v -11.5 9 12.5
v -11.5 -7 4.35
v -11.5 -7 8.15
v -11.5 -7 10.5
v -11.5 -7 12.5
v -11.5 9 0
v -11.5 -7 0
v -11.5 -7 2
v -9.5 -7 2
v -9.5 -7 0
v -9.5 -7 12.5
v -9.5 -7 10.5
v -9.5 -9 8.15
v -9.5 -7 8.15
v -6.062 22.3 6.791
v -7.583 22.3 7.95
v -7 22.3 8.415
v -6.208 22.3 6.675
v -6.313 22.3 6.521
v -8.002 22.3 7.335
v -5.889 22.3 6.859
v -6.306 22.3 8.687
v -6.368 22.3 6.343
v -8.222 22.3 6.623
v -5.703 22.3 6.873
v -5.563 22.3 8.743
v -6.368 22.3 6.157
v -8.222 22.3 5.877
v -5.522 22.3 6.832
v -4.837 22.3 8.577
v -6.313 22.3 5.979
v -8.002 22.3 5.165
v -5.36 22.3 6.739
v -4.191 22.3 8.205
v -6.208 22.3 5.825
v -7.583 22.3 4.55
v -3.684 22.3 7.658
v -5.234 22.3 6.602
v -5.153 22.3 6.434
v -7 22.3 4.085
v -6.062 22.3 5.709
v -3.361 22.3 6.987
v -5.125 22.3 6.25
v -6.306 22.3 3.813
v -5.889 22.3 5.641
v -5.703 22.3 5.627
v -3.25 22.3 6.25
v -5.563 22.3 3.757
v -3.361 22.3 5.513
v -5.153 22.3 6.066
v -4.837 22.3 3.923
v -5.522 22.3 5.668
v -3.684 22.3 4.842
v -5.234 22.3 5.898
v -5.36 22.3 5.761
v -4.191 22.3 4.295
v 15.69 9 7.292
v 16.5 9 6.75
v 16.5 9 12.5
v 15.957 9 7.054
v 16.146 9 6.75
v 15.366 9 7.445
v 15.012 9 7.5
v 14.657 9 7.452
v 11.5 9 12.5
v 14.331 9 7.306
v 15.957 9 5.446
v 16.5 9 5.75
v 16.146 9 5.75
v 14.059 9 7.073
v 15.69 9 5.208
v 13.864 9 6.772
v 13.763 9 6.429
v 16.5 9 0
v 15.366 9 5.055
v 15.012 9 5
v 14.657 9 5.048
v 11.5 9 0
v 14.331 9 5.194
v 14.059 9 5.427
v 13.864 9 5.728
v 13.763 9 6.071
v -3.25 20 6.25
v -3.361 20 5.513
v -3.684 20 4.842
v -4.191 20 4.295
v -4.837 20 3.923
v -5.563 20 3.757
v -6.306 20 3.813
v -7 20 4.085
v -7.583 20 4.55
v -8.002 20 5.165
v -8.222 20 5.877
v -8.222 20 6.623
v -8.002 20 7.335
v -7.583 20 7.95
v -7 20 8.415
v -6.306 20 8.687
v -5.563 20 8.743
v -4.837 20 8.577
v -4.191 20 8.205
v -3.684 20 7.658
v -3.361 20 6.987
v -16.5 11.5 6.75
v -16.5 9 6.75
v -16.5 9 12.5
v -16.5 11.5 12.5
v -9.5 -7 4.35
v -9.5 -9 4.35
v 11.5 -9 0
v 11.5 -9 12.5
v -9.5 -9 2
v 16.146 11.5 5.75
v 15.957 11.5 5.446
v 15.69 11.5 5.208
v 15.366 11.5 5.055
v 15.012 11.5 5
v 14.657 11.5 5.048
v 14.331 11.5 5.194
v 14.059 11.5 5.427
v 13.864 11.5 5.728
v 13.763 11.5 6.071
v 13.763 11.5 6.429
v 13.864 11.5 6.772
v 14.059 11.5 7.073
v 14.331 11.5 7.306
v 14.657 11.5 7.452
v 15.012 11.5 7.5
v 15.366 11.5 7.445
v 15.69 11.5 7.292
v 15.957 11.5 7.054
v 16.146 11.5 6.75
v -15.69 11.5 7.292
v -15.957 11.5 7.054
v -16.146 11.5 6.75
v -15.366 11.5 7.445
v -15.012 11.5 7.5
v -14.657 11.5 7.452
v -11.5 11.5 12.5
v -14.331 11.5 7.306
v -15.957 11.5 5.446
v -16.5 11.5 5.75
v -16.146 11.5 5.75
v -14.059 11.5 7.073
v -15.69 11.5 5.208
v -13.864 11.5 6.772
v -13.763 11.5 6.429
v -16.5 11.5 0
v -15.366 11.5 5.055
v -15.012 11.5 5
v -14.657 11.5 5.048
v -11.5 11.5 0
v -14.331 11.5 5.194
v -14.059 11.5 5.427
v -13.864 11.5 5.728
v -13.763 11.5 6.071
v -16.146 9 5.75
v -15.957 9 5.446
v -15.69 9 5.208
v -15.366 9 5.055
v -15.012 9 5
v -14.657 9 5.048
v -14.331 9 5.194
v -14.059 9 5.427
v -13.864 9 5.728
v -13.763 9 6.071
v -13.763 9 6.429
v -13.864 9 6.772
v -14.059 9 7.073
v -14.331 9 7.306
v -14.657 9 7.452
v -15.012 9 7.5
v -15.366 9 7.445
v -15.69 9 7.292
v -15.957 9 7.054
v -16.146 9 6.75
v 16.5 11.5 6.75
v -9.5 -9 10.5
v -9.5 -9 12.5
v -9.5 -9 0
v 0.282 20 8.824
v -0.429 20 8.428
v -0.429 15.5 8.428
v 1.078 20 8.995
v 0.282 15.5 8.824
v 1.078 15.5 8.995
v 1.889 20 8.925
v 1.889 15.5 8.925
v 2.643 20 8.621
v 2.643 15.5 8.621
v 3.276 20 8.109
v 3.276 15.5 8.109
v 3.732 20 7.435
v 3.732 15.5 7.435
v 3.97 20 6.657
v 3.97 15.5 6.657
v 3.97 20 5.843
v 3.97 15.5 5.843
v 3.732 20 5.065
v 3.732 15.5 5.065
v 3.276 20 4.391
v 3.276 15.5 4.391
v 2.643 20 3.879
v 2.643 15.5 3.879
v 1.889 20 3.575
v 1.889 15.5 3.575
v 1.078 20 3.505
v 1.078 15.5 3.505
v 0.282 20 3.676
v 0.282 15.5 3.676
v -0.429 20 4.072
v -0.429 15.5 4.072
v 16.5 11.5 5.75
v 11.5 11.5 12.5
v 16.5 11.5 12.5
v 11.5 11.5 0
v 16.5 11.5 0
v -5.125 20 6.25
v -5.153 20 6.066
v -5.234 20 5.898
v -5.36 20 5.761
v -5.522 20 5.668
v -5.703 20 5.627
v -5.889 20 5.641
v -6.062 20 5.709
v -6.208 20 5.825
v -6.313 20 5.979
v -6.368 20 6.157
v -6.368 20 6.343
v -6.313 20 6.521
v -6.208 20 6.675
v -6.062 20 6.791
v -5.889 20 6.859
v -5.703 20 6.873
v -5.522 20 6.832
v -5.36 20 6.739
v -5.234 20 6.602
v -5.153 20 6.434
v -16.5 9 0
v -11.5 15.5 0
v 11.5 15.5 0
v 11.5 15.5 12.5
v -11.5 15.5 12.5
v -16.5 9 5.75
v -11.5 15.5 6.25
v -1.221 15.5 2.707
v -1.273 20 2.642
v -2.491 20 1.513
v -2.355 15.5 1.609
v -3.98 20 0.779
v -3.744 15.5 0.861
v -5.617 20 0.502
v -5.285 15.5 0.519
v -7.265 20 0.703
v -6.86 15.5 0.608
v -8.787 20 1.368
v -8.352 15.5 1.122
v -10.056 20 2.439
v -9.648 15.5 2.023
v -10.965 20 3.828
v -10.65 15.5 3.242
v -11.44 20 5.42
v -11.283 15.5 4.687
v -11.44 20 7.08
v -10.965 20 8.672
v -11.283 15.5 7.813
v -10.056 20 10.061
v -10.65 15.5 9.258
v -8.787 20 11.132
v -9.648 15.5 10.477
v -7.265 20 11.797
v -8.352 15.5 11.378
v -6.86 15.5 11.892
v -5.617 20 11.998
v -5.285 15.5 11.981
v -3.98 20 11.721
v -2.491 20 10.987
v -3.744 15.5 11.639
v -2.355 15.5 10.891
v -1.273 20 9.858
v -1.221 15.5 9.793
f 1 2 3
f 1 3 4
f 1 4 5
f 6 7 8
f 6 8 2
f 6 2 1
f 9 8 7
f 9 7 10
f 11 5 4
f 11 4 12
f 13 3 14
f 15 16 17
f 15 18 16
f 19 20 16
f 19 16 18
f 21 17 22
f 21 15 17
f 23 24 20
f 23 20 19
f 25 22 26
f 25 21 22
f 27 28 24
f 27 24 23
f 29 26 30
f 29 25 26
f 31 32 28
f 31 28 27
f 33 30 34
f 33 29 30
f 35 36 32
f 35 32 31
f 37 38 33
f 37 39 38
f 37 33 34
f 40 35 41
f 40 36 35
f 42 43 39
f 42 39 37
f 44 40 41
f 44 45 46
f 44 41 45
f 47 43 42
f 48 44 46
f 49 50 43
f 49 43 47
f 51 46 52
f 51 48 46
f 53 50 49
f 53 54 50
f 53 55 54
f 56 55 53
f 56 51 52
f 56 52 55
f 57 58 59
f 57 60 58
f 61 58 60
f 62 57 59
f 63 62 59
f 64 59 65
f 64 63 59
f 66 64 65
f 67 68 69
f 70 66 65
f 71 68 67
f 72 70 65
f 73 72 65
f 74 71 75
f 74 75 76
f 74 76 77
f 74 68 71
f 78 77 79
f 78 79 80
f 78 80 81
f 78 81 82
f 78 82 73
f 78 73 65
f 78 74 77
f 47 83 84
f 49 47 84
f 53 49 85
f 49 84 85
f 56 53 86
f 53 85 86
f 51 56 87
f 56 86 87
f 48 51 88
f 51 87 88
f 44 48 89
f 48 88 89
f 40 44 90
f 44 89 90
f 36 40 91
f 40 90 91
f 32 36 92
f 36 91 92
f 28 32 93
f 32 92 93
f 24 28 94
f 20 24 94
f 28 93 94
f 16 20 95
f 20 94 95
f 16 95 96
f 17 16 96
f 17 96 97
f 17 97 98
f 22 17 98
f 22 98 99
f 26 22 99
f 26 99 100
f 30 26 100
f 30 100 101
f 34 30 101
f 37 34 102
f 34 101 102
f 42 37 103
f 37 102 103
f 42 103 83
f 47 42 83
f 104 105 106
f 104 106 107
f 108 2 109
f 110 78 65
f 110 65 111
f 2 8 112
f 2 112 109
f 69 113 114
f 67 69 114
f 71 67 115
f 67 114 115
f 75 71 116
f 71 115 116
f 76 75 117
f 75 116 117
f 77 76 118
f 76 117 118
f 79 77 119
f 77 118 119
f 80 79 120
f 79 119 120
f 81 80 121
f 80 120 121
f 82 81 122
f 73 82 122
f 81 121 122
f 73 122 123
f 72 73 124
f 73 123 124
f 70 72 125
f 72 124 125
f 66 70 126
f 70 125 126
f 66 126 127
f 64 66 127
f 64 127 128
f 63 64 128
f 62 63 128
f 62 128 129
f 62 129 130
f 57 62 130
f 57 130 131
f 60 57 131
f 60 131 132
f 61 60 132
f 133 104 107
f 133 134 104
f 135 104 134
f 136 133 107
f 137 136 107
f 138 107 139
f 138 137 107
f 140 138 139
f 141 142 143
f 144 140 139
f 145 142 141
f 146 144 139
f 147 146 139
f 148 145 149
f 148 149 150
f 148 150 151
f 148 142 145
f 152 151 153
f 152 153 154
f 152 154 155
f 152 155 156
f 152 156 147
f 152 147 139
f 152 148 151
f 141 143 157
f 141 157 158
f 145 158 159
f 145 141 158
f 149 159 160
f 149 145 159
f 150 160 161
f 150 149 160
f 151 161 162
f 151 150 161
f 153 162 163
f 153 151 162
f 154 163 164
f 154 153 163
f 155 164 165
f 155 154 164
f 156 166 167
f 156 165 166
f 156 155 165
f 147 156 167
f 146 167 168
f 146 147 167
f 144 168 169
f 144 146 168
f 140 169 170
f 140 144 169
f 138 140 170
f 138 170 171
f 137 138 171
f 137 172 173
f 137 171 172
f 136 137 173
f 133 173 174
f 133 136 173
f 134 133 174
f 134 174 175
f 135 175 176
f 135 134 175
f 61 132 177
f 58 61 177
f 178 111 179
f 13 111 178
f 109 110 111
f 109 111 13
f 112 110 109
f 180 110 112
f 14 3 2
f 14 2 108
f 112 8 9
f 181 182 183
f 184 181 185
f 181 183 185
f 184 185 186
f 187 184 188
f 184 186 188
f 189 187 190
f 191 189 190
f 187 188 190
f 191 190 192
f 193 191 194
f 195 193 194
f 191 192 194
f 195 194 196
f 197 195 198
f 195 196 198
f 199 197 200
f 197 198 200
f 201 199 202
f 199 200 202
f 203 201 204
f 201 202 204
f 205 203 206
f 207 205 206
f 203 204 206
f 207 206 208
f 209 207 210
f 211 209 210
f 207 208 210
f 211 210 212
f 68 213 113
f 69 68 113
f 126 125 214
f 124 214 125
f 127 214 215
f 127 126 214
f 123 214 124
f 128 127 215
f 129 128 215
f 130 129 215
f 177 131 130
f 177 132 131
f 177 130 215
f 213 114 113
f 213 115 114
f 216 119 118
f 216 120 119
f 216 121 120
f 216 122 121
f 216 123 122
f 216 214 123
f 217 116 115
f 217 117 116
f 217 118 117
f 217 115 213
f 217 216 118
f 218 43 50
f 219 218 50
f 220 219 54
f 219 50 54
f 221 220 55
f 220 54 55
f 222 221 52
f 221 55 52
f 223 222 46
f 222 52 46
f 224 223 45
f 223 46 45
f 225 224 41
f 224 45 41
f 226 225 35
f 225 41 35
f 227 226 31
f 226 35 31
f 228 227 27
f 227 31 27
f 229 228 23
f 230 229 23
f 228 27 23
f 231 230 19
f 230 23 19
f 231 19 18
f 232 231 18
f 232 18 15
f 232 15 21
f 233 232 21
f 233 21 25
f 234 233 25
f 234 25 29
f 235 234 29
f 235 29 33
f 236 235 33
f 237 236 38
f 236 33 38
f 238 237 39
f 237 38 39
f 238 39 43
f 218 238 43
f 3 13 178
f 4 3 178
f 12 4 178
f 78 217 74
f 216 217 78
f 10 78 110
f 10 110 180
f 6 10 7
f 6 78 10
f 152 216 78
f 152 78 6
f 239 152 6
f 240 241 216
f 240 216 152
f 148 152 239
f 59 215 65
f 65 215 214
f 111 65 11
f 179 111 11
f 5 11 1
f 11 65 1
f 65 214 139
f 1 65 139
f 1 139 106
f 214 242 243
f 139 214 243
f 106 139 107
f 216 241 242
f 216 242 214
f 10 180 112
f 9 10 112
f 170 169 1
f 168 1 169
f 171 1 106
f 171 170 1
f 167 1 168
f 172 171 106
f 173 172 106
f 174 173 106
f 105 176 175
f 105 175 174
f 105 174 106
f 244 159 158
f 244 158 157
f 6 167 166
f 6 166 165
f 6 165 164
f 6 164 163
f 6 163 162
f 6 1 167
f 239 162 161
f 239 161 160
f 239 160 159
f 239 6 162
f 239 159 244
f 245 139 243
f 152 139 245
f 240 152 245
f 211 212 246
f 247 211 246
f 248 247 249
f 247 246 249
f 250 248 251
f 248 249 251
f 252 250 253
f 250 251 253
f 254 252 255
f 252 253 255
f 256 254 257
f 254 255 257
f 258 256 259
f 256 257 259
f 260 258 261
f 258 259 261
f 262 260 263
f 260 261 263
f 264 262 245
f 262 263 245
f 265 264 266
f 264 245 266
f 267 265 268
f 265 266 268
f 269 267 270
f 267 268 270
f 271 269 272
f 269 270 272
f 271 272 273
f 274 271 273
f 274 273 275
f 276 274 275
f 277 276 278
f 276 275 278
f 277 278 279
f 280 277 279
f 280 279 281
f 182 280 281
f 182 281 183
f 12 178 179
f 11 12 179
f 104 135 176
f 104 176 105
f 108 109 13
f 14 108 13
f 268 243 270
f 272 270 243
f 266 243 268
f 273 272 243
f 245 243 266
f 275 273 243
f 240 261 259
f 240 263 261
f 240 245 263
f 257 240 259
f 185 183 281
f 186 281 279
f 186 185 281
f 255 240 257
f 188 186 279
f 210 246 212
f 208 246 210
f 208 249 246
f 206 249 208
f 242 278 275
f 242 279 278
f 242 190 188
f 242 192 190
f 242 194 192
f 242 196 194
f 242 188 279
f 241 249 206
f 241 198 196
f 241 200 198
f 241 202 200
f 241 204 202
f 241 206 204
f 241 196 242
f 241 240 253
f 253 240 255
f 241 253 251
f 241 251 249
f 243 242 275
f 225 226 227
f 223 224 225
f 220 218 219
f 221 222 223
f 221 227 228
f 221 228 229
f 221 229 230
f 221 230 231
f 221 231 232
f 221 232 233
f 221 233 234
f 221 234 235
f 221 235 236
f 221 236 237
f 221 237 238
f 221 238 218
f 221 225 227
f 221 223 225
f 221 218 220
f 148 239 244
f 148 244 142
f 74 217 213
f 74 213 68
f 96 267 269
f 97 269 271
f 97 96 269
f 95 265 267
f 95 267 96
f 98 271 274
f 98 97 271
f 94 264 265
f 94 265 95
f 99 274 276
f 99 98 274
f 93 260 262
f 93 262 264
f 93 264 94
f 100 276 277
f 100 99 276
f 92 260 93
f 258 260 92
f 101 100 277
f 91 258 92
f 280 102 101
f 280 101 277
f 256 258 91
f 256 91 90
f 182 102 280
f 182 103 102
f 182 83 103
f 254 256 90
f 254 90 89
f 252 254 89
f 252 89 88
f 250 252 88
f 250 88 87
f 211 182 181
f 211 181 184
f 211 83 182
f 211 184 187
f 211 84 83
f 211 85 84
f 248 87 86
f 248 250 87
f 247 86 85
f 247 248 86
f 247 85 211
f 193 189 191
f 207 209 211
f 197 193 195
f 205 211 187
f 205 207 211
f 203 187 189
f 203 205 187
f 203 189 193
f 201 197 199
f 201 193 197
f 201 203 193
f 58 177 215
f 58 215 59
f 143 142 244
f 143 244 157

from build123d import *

# Parameters (mm, degrees)
BOSS_EXTRUDE1_DEPTH = 12.5
BOSS_EXTRUDE2_DEPTH = 4.5
CHAMFER1_SIZE       = 2
SKETCH3_W           = 2
SKETCH3_H           = 2
SKETCH3_H_2         = 3.8
CUT_EXTRUDE1_DEPTH  = 2
CUT_EXTRUDE2_DEPTH  = 5
SKETCH5_R           = 2.5
BOSS_EXTRUDE3_DEPTH = 2.3
SKETCH6_R           = 0.625
CUT_EXTRUDE3_DEPTH  = 2.3


with BuildPart() as part:
    # Sketch1 → Boss-Extrude1 (new body)
    with BuildSketch(Plane.XY):
        Polygon((11.5, 9), (11.5, -9), (-11.5, -9), (-11.5, 9), (-16.5, 9), (-16.5, 11.5), (-11.5, 11.5), (-11.5, 15.5), (11.5, 15.5), (11.5, 11.5), (16.5, 11.5), (16.5, 9), align=None)
    extrude(amount=BOSS_EXTRUDE1_DEPTH)

    # Sketch2 → Boss-Extrude2 (add)
    with BuildSketch(Plane(origin=(0, 15.5, 0), x_dir=(1, 0, 0), z_dir=(0, 1, 0))):
        with BuildLine():
            ThreePointArc((-0.428571429, -4.071721331), (-11.5, -6.25), (-0.428571429, -8.428278669))
            ThreePointArc((-0.428571429, -8.428278669), (4, -6.25), (-0.428571429, -4.071721331))
        make_face()
    extrude(amount=BOSS_EXTRUDE2_DEPTH)

    # Chamfer1
    chamfer1_edges = [part.edges().sort_by_distance(p)[0] for p in [
        (-11.5, -9, 6.25),
    ]]
    chamfer(chamfer1_edges, length=CHAMFER1_SIZE)

    # Sketch3 → Cut-Extrude1 (cut)
    with BuildSketch(Plane.XZ.offset(9)):
        with Locations((-10.5, 1)):
            Rectangle(SKETCH3_W, SKETCH3_H)
        with Locations((-10.5, 11.5)):
            Rectangle(SKETCH3_W, SKETCH3_H)
        with Locations((-10.5, 6.25)):
            Rectangle(SKETCH3_W, SKETCH3_H_2)
    extrude(amount=-CUT_EXTRUDE1_DEPTH, mode=Mode.SUBTRACT)

    # Sketch4 → Cut-Extrude2 (cut)
    with BuildSketch(Plane(origin=(0, 11.5, 0), x_dir=(1, 0, 0), z_dir=(0, 1, 0))):
        with BuildLine():
            Line((16.145643924, -6.75), (17.156032055, -6.75))
            Line((17.156032055, -6.75), (17.156032055, -5.75))
            Line((17.156032055, -5.75), (16.145643924, -5.75))
            ThreePointArc((16.145643924, -5.75), (13.75, -6.25), (16.145643924, -6.75))
        make_face()
    cut_extrude2 = extrude(amount=-CUT_EXTRUDE2_DEPTH, mode=Mode.SUBTRACT)

    # Mirror1: Cut-Extrude2 across plane
    add(cut_extrude2.mirror(Plane.ZY), mode=Mode.SUBTRACT)

    # Sketch5 → Boss-Extrude3 (add)
    with BuildSketch(Plane(origin=(0, 20, 0), x_dir=(1, 0, 0), z_dir=(0, 1, 0))):
        with Locations((-5.75, -6.25)):
            Circle(SKETCH5_R)
    extrude(amount=BOSS_EXTRUDE3_DEPTH)

    # Sketch6 → Cut-Extrude3 (cut)
    with BuildSketch(Plane(origin=(0, 22.3, 0), x_dir=(1, 0, 0), z_dir=(0, 1, 0))):
        with Locations((-5.75, -6.25)):
            Circle(SKETCH6_R)
    extrude(amount=-CUT_EXTRUDE3_DEPTH, mode=Mode.SUBTRACT)


solid = part.part
